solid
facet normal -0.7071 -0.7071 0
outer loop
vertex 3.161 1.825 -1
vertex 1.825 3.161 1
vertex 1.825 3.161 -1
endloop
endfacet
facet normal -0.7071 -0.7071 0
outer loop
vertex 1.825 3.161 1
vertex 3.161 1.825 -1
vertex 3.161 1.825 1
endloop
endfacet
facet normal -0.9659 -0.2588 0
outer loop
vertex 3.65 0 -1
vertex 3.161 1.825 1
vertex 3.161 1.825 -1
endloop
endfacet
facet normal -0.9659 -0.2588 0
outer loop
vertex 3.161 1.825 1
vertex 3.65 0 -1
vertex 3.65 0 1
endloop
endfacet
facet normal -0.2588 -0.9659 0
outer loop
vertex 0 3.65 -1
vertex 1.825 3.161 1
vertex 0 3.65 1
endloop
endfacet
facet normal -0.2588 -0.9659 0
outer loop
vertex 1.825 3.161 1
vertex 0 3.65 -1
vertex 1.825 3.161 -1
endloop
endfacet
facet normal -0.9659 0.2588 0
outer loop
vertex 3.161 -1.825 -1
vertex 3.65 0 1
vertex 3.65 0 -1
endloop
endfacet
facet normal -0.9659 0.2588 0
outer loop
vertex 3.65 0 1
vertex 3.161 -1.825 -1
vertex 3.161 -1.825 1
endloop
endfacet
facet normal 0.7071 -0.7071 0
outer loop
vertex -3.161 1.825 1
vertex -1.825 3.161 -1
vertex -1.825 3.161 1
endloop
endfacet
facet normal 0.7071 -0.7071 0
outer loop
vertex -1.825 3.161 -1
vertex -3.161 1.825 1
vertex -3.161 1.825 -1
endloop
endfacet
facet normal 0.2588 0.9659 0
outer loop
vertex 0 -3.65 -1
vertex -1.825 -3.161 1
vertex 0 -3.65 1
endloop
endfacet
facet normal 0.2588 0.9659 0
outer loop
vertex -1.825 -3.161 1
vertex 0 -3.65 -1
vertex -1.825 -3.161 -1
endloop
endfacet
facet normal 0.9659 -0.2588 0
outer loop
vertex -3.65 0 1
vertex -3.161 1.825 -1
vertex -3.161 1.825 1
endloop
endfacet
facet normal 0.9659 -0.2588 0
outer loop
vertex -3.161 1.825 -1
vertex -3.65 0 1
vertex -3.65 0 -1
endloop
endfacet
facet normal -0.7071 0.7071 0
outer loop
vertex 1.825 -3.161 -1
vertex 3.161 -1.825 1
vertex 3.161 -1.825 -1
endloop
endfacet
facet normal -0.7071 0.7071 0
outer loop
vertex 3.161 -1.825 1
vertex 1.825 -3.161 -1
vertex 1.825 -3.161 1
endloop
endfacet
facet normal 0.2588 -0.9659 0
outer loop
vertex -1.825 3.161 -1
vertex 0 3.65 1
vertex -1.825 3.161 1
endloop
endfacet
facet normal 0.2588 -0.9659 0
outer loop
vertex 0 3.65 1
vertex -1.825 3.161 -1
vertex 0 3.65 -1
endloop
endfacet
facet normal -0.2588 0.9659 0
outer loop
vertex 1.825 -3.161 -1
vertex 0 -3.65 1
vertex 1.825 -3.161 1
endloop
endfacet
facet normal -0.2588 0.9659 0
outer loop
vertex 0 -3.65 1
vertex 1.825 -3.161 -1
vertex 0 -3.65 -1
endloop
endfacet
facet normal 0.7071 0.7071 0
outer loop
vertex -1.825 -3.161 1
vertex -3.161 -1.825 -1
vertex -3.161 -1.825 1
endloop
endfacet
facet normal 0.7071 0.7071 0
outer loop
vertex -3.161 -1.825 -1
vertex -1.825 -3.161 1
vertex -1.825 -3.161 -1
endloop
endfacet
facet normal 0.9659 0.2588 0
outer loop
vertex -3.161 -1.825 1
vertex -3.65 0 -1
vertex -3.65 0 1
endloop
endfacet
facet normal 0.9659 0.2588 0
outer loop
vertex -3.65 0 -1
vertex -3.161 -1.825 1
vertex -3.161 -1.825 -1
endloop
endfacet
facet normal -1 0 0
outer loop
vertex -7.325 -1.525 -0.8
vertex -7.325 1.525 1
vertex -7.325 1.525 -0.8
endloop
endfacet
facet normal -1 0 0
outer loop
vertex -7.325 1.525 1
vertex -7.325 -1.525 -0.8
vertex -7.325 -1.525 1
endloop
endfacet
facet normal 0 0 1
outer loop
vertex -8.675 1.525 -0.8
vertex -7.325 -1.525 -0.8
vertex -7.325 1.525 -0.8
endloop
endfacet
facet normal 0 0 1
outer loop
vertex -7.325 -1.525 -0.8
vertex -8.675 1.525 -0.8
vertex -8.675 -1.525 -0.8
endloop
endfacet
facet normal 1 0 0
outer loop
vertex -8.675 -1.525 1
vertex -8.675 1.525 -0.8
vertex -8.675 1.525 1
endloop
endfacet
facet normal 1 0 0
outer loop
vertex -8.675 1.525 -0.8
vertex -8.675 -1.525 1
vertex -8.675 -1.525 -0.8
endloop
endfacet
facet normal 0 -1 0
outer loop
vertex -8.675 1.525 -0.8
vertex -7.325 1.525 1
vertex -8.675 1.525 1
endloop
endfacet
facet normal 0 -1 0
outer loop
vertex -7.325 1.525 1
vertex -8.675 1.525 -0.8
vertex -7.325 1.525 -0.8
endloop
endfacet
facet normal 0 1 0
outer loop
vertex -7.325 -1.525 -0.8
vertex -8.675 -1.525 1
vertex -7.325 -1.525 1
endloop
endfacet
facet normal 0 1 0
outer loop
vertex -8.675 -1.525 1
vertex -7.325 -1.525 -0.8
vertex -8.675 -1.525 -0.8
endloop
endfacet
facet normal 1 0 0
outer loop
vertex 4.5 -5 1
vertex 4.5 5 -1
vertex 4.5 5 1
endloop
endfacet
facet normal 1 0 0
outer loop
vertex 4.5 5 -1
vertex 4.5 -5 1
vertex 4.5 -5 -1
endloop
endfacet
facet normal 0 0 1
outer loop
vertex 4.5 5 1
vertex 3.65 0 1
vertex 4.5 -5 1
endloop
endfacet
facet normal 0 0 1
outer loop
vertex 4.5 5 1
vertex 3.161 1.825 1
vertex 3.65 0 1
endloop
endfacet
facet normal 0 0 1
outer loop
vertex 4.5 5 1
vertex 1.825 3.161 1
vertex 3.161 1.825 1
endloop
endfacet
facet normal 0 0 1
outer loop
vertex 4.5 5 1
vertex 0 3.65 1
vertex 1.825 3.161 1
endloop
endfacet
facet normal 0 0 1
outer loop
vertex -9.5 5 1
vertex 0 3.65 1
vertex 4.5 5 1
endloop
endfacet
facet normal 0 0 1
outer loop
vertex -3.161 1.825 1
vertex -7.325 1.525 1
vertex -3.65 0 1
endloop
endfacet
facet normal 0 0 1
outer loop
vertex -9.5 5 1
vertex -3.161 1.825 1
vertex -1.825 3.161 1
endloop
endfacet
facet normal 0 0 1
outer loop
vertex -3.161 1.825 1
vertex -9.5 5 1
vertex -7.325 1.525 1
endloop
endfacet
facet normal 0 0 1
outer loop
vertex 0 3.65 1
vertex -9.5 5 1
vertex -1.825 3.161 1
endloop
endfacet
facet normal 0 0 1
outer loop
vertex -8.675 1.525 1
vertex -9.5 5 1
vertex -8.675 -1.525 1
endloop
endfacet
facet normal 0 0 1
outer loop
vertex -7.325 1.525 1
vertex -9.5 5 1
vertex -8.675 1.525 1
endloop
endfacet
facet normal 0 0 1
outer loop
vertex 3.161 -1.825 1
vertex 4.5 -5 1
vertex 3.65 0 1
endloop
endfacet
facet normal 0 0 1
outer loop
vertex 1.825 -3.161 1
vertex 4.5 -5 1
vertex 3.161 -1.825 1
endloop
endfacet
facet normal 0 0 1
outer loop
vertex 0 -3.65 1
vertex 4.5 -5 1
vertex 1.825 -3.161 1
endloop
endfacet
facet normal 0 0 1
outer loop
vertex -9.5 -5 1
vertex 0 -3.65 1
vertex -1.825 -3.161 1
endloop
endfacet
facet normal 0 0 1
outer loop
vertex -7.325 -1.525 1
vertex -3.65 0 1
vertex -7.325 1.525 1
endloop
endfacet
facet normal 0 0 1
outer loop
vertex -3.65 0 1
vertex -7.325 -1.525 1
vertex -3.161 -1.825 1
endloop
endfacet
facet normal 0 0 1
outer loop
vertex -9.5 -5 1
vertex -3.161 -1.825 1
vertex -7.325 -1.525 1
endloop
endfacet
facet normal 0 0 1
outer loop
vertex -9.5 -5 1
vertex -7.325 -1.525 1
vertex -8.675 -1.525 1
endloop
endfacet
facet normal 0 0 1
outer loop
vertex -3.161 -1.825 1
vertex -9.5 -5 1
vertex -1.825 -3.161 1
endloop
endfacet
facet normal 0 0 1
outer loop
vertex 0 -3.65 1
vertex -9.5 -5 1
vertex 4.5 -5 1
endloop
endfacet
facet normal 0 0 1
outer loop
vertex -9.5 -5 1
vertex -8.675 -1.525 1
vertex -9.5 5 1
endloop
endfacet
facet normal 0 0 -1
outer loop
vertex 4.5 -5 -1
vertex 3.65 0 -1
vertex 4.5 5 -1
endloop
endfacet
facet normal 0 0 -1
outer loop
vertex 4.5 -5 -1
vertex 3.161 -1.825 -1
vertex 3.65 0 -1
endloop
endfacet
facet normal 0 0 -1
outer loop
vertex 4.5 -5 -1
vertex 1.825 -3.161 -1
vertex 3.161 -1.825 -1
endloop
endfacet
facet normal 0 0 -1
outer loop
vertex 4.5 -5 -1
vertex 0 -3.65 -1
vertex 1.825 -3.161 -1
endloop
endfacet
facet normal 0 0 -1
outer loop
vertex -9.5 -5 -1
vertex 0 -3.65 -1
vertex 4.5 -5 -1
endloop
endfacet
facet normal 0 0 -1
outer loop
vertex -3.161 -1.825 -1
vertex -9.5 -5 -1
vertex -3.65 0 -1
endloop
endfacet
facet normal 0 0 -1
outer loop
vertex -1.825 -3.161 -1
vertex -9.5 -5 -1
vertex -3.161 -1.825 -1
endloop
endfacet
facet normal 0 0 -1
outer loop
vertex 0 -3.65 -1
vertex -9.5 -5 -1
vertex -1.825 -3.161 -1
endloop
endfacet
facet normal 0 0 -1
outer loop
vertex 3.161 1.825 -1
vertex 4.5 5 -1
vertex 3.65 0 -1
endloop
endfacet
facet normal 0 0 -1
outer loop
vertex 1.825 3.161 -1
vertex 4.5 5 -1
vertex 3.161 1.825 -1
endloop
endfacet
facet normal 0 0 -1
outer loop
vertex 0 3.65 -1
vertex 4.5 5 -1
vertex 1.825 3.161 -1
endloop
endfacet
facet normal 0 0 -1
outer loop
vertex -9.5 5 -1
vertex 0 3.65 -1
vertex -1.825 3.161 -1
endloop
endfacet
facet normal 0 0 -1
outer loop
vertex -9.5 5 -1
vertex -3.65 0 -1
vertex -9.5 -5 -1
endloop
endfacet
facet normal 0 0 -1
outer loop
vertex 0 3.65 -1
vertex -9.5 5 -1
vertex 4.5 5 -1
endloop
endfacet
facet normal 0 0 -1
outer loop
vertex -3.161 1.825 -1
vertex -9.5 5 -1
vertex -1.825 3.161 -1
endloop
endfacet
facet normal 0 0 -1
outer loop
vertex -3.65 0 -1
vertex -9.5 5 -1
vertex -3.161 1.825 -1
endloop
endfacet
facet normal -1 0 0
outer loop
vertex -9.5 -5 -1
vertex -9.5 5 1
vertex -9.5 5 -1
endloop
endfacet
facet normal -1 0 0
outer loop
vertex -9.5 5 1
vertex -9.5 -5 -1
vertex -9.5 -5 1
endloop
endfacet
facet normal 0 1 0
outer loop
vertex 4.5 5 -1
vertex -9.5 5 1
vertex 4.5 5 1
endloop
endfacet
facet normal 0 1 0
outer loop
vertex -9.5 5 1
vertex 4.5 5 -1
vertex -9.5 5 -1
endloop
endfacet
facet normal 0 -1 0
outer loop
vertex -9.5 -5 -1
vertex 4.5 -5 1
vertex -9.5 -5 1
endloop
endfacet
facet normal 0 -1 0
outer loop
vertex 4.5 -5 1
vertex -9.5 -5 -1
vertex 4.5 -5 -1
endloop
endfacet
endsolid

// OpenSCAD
/*

cd /Users/d/Desktop/3dprint/ImplicitCad/
~/.cabal/bin/extopenscad pot5.scad

*/

$res=0.1;

module pot() {
	cylinder(r=3.65, h=5, center = true);
	translate([-8, 0, 0.2])
	cube(size = [1.35, 3.05, 2], center = true);
}

difference(){
    translate([-2.5,0,0])
	cube(size = [14, 10, 2], center = true);
	pot();
}
